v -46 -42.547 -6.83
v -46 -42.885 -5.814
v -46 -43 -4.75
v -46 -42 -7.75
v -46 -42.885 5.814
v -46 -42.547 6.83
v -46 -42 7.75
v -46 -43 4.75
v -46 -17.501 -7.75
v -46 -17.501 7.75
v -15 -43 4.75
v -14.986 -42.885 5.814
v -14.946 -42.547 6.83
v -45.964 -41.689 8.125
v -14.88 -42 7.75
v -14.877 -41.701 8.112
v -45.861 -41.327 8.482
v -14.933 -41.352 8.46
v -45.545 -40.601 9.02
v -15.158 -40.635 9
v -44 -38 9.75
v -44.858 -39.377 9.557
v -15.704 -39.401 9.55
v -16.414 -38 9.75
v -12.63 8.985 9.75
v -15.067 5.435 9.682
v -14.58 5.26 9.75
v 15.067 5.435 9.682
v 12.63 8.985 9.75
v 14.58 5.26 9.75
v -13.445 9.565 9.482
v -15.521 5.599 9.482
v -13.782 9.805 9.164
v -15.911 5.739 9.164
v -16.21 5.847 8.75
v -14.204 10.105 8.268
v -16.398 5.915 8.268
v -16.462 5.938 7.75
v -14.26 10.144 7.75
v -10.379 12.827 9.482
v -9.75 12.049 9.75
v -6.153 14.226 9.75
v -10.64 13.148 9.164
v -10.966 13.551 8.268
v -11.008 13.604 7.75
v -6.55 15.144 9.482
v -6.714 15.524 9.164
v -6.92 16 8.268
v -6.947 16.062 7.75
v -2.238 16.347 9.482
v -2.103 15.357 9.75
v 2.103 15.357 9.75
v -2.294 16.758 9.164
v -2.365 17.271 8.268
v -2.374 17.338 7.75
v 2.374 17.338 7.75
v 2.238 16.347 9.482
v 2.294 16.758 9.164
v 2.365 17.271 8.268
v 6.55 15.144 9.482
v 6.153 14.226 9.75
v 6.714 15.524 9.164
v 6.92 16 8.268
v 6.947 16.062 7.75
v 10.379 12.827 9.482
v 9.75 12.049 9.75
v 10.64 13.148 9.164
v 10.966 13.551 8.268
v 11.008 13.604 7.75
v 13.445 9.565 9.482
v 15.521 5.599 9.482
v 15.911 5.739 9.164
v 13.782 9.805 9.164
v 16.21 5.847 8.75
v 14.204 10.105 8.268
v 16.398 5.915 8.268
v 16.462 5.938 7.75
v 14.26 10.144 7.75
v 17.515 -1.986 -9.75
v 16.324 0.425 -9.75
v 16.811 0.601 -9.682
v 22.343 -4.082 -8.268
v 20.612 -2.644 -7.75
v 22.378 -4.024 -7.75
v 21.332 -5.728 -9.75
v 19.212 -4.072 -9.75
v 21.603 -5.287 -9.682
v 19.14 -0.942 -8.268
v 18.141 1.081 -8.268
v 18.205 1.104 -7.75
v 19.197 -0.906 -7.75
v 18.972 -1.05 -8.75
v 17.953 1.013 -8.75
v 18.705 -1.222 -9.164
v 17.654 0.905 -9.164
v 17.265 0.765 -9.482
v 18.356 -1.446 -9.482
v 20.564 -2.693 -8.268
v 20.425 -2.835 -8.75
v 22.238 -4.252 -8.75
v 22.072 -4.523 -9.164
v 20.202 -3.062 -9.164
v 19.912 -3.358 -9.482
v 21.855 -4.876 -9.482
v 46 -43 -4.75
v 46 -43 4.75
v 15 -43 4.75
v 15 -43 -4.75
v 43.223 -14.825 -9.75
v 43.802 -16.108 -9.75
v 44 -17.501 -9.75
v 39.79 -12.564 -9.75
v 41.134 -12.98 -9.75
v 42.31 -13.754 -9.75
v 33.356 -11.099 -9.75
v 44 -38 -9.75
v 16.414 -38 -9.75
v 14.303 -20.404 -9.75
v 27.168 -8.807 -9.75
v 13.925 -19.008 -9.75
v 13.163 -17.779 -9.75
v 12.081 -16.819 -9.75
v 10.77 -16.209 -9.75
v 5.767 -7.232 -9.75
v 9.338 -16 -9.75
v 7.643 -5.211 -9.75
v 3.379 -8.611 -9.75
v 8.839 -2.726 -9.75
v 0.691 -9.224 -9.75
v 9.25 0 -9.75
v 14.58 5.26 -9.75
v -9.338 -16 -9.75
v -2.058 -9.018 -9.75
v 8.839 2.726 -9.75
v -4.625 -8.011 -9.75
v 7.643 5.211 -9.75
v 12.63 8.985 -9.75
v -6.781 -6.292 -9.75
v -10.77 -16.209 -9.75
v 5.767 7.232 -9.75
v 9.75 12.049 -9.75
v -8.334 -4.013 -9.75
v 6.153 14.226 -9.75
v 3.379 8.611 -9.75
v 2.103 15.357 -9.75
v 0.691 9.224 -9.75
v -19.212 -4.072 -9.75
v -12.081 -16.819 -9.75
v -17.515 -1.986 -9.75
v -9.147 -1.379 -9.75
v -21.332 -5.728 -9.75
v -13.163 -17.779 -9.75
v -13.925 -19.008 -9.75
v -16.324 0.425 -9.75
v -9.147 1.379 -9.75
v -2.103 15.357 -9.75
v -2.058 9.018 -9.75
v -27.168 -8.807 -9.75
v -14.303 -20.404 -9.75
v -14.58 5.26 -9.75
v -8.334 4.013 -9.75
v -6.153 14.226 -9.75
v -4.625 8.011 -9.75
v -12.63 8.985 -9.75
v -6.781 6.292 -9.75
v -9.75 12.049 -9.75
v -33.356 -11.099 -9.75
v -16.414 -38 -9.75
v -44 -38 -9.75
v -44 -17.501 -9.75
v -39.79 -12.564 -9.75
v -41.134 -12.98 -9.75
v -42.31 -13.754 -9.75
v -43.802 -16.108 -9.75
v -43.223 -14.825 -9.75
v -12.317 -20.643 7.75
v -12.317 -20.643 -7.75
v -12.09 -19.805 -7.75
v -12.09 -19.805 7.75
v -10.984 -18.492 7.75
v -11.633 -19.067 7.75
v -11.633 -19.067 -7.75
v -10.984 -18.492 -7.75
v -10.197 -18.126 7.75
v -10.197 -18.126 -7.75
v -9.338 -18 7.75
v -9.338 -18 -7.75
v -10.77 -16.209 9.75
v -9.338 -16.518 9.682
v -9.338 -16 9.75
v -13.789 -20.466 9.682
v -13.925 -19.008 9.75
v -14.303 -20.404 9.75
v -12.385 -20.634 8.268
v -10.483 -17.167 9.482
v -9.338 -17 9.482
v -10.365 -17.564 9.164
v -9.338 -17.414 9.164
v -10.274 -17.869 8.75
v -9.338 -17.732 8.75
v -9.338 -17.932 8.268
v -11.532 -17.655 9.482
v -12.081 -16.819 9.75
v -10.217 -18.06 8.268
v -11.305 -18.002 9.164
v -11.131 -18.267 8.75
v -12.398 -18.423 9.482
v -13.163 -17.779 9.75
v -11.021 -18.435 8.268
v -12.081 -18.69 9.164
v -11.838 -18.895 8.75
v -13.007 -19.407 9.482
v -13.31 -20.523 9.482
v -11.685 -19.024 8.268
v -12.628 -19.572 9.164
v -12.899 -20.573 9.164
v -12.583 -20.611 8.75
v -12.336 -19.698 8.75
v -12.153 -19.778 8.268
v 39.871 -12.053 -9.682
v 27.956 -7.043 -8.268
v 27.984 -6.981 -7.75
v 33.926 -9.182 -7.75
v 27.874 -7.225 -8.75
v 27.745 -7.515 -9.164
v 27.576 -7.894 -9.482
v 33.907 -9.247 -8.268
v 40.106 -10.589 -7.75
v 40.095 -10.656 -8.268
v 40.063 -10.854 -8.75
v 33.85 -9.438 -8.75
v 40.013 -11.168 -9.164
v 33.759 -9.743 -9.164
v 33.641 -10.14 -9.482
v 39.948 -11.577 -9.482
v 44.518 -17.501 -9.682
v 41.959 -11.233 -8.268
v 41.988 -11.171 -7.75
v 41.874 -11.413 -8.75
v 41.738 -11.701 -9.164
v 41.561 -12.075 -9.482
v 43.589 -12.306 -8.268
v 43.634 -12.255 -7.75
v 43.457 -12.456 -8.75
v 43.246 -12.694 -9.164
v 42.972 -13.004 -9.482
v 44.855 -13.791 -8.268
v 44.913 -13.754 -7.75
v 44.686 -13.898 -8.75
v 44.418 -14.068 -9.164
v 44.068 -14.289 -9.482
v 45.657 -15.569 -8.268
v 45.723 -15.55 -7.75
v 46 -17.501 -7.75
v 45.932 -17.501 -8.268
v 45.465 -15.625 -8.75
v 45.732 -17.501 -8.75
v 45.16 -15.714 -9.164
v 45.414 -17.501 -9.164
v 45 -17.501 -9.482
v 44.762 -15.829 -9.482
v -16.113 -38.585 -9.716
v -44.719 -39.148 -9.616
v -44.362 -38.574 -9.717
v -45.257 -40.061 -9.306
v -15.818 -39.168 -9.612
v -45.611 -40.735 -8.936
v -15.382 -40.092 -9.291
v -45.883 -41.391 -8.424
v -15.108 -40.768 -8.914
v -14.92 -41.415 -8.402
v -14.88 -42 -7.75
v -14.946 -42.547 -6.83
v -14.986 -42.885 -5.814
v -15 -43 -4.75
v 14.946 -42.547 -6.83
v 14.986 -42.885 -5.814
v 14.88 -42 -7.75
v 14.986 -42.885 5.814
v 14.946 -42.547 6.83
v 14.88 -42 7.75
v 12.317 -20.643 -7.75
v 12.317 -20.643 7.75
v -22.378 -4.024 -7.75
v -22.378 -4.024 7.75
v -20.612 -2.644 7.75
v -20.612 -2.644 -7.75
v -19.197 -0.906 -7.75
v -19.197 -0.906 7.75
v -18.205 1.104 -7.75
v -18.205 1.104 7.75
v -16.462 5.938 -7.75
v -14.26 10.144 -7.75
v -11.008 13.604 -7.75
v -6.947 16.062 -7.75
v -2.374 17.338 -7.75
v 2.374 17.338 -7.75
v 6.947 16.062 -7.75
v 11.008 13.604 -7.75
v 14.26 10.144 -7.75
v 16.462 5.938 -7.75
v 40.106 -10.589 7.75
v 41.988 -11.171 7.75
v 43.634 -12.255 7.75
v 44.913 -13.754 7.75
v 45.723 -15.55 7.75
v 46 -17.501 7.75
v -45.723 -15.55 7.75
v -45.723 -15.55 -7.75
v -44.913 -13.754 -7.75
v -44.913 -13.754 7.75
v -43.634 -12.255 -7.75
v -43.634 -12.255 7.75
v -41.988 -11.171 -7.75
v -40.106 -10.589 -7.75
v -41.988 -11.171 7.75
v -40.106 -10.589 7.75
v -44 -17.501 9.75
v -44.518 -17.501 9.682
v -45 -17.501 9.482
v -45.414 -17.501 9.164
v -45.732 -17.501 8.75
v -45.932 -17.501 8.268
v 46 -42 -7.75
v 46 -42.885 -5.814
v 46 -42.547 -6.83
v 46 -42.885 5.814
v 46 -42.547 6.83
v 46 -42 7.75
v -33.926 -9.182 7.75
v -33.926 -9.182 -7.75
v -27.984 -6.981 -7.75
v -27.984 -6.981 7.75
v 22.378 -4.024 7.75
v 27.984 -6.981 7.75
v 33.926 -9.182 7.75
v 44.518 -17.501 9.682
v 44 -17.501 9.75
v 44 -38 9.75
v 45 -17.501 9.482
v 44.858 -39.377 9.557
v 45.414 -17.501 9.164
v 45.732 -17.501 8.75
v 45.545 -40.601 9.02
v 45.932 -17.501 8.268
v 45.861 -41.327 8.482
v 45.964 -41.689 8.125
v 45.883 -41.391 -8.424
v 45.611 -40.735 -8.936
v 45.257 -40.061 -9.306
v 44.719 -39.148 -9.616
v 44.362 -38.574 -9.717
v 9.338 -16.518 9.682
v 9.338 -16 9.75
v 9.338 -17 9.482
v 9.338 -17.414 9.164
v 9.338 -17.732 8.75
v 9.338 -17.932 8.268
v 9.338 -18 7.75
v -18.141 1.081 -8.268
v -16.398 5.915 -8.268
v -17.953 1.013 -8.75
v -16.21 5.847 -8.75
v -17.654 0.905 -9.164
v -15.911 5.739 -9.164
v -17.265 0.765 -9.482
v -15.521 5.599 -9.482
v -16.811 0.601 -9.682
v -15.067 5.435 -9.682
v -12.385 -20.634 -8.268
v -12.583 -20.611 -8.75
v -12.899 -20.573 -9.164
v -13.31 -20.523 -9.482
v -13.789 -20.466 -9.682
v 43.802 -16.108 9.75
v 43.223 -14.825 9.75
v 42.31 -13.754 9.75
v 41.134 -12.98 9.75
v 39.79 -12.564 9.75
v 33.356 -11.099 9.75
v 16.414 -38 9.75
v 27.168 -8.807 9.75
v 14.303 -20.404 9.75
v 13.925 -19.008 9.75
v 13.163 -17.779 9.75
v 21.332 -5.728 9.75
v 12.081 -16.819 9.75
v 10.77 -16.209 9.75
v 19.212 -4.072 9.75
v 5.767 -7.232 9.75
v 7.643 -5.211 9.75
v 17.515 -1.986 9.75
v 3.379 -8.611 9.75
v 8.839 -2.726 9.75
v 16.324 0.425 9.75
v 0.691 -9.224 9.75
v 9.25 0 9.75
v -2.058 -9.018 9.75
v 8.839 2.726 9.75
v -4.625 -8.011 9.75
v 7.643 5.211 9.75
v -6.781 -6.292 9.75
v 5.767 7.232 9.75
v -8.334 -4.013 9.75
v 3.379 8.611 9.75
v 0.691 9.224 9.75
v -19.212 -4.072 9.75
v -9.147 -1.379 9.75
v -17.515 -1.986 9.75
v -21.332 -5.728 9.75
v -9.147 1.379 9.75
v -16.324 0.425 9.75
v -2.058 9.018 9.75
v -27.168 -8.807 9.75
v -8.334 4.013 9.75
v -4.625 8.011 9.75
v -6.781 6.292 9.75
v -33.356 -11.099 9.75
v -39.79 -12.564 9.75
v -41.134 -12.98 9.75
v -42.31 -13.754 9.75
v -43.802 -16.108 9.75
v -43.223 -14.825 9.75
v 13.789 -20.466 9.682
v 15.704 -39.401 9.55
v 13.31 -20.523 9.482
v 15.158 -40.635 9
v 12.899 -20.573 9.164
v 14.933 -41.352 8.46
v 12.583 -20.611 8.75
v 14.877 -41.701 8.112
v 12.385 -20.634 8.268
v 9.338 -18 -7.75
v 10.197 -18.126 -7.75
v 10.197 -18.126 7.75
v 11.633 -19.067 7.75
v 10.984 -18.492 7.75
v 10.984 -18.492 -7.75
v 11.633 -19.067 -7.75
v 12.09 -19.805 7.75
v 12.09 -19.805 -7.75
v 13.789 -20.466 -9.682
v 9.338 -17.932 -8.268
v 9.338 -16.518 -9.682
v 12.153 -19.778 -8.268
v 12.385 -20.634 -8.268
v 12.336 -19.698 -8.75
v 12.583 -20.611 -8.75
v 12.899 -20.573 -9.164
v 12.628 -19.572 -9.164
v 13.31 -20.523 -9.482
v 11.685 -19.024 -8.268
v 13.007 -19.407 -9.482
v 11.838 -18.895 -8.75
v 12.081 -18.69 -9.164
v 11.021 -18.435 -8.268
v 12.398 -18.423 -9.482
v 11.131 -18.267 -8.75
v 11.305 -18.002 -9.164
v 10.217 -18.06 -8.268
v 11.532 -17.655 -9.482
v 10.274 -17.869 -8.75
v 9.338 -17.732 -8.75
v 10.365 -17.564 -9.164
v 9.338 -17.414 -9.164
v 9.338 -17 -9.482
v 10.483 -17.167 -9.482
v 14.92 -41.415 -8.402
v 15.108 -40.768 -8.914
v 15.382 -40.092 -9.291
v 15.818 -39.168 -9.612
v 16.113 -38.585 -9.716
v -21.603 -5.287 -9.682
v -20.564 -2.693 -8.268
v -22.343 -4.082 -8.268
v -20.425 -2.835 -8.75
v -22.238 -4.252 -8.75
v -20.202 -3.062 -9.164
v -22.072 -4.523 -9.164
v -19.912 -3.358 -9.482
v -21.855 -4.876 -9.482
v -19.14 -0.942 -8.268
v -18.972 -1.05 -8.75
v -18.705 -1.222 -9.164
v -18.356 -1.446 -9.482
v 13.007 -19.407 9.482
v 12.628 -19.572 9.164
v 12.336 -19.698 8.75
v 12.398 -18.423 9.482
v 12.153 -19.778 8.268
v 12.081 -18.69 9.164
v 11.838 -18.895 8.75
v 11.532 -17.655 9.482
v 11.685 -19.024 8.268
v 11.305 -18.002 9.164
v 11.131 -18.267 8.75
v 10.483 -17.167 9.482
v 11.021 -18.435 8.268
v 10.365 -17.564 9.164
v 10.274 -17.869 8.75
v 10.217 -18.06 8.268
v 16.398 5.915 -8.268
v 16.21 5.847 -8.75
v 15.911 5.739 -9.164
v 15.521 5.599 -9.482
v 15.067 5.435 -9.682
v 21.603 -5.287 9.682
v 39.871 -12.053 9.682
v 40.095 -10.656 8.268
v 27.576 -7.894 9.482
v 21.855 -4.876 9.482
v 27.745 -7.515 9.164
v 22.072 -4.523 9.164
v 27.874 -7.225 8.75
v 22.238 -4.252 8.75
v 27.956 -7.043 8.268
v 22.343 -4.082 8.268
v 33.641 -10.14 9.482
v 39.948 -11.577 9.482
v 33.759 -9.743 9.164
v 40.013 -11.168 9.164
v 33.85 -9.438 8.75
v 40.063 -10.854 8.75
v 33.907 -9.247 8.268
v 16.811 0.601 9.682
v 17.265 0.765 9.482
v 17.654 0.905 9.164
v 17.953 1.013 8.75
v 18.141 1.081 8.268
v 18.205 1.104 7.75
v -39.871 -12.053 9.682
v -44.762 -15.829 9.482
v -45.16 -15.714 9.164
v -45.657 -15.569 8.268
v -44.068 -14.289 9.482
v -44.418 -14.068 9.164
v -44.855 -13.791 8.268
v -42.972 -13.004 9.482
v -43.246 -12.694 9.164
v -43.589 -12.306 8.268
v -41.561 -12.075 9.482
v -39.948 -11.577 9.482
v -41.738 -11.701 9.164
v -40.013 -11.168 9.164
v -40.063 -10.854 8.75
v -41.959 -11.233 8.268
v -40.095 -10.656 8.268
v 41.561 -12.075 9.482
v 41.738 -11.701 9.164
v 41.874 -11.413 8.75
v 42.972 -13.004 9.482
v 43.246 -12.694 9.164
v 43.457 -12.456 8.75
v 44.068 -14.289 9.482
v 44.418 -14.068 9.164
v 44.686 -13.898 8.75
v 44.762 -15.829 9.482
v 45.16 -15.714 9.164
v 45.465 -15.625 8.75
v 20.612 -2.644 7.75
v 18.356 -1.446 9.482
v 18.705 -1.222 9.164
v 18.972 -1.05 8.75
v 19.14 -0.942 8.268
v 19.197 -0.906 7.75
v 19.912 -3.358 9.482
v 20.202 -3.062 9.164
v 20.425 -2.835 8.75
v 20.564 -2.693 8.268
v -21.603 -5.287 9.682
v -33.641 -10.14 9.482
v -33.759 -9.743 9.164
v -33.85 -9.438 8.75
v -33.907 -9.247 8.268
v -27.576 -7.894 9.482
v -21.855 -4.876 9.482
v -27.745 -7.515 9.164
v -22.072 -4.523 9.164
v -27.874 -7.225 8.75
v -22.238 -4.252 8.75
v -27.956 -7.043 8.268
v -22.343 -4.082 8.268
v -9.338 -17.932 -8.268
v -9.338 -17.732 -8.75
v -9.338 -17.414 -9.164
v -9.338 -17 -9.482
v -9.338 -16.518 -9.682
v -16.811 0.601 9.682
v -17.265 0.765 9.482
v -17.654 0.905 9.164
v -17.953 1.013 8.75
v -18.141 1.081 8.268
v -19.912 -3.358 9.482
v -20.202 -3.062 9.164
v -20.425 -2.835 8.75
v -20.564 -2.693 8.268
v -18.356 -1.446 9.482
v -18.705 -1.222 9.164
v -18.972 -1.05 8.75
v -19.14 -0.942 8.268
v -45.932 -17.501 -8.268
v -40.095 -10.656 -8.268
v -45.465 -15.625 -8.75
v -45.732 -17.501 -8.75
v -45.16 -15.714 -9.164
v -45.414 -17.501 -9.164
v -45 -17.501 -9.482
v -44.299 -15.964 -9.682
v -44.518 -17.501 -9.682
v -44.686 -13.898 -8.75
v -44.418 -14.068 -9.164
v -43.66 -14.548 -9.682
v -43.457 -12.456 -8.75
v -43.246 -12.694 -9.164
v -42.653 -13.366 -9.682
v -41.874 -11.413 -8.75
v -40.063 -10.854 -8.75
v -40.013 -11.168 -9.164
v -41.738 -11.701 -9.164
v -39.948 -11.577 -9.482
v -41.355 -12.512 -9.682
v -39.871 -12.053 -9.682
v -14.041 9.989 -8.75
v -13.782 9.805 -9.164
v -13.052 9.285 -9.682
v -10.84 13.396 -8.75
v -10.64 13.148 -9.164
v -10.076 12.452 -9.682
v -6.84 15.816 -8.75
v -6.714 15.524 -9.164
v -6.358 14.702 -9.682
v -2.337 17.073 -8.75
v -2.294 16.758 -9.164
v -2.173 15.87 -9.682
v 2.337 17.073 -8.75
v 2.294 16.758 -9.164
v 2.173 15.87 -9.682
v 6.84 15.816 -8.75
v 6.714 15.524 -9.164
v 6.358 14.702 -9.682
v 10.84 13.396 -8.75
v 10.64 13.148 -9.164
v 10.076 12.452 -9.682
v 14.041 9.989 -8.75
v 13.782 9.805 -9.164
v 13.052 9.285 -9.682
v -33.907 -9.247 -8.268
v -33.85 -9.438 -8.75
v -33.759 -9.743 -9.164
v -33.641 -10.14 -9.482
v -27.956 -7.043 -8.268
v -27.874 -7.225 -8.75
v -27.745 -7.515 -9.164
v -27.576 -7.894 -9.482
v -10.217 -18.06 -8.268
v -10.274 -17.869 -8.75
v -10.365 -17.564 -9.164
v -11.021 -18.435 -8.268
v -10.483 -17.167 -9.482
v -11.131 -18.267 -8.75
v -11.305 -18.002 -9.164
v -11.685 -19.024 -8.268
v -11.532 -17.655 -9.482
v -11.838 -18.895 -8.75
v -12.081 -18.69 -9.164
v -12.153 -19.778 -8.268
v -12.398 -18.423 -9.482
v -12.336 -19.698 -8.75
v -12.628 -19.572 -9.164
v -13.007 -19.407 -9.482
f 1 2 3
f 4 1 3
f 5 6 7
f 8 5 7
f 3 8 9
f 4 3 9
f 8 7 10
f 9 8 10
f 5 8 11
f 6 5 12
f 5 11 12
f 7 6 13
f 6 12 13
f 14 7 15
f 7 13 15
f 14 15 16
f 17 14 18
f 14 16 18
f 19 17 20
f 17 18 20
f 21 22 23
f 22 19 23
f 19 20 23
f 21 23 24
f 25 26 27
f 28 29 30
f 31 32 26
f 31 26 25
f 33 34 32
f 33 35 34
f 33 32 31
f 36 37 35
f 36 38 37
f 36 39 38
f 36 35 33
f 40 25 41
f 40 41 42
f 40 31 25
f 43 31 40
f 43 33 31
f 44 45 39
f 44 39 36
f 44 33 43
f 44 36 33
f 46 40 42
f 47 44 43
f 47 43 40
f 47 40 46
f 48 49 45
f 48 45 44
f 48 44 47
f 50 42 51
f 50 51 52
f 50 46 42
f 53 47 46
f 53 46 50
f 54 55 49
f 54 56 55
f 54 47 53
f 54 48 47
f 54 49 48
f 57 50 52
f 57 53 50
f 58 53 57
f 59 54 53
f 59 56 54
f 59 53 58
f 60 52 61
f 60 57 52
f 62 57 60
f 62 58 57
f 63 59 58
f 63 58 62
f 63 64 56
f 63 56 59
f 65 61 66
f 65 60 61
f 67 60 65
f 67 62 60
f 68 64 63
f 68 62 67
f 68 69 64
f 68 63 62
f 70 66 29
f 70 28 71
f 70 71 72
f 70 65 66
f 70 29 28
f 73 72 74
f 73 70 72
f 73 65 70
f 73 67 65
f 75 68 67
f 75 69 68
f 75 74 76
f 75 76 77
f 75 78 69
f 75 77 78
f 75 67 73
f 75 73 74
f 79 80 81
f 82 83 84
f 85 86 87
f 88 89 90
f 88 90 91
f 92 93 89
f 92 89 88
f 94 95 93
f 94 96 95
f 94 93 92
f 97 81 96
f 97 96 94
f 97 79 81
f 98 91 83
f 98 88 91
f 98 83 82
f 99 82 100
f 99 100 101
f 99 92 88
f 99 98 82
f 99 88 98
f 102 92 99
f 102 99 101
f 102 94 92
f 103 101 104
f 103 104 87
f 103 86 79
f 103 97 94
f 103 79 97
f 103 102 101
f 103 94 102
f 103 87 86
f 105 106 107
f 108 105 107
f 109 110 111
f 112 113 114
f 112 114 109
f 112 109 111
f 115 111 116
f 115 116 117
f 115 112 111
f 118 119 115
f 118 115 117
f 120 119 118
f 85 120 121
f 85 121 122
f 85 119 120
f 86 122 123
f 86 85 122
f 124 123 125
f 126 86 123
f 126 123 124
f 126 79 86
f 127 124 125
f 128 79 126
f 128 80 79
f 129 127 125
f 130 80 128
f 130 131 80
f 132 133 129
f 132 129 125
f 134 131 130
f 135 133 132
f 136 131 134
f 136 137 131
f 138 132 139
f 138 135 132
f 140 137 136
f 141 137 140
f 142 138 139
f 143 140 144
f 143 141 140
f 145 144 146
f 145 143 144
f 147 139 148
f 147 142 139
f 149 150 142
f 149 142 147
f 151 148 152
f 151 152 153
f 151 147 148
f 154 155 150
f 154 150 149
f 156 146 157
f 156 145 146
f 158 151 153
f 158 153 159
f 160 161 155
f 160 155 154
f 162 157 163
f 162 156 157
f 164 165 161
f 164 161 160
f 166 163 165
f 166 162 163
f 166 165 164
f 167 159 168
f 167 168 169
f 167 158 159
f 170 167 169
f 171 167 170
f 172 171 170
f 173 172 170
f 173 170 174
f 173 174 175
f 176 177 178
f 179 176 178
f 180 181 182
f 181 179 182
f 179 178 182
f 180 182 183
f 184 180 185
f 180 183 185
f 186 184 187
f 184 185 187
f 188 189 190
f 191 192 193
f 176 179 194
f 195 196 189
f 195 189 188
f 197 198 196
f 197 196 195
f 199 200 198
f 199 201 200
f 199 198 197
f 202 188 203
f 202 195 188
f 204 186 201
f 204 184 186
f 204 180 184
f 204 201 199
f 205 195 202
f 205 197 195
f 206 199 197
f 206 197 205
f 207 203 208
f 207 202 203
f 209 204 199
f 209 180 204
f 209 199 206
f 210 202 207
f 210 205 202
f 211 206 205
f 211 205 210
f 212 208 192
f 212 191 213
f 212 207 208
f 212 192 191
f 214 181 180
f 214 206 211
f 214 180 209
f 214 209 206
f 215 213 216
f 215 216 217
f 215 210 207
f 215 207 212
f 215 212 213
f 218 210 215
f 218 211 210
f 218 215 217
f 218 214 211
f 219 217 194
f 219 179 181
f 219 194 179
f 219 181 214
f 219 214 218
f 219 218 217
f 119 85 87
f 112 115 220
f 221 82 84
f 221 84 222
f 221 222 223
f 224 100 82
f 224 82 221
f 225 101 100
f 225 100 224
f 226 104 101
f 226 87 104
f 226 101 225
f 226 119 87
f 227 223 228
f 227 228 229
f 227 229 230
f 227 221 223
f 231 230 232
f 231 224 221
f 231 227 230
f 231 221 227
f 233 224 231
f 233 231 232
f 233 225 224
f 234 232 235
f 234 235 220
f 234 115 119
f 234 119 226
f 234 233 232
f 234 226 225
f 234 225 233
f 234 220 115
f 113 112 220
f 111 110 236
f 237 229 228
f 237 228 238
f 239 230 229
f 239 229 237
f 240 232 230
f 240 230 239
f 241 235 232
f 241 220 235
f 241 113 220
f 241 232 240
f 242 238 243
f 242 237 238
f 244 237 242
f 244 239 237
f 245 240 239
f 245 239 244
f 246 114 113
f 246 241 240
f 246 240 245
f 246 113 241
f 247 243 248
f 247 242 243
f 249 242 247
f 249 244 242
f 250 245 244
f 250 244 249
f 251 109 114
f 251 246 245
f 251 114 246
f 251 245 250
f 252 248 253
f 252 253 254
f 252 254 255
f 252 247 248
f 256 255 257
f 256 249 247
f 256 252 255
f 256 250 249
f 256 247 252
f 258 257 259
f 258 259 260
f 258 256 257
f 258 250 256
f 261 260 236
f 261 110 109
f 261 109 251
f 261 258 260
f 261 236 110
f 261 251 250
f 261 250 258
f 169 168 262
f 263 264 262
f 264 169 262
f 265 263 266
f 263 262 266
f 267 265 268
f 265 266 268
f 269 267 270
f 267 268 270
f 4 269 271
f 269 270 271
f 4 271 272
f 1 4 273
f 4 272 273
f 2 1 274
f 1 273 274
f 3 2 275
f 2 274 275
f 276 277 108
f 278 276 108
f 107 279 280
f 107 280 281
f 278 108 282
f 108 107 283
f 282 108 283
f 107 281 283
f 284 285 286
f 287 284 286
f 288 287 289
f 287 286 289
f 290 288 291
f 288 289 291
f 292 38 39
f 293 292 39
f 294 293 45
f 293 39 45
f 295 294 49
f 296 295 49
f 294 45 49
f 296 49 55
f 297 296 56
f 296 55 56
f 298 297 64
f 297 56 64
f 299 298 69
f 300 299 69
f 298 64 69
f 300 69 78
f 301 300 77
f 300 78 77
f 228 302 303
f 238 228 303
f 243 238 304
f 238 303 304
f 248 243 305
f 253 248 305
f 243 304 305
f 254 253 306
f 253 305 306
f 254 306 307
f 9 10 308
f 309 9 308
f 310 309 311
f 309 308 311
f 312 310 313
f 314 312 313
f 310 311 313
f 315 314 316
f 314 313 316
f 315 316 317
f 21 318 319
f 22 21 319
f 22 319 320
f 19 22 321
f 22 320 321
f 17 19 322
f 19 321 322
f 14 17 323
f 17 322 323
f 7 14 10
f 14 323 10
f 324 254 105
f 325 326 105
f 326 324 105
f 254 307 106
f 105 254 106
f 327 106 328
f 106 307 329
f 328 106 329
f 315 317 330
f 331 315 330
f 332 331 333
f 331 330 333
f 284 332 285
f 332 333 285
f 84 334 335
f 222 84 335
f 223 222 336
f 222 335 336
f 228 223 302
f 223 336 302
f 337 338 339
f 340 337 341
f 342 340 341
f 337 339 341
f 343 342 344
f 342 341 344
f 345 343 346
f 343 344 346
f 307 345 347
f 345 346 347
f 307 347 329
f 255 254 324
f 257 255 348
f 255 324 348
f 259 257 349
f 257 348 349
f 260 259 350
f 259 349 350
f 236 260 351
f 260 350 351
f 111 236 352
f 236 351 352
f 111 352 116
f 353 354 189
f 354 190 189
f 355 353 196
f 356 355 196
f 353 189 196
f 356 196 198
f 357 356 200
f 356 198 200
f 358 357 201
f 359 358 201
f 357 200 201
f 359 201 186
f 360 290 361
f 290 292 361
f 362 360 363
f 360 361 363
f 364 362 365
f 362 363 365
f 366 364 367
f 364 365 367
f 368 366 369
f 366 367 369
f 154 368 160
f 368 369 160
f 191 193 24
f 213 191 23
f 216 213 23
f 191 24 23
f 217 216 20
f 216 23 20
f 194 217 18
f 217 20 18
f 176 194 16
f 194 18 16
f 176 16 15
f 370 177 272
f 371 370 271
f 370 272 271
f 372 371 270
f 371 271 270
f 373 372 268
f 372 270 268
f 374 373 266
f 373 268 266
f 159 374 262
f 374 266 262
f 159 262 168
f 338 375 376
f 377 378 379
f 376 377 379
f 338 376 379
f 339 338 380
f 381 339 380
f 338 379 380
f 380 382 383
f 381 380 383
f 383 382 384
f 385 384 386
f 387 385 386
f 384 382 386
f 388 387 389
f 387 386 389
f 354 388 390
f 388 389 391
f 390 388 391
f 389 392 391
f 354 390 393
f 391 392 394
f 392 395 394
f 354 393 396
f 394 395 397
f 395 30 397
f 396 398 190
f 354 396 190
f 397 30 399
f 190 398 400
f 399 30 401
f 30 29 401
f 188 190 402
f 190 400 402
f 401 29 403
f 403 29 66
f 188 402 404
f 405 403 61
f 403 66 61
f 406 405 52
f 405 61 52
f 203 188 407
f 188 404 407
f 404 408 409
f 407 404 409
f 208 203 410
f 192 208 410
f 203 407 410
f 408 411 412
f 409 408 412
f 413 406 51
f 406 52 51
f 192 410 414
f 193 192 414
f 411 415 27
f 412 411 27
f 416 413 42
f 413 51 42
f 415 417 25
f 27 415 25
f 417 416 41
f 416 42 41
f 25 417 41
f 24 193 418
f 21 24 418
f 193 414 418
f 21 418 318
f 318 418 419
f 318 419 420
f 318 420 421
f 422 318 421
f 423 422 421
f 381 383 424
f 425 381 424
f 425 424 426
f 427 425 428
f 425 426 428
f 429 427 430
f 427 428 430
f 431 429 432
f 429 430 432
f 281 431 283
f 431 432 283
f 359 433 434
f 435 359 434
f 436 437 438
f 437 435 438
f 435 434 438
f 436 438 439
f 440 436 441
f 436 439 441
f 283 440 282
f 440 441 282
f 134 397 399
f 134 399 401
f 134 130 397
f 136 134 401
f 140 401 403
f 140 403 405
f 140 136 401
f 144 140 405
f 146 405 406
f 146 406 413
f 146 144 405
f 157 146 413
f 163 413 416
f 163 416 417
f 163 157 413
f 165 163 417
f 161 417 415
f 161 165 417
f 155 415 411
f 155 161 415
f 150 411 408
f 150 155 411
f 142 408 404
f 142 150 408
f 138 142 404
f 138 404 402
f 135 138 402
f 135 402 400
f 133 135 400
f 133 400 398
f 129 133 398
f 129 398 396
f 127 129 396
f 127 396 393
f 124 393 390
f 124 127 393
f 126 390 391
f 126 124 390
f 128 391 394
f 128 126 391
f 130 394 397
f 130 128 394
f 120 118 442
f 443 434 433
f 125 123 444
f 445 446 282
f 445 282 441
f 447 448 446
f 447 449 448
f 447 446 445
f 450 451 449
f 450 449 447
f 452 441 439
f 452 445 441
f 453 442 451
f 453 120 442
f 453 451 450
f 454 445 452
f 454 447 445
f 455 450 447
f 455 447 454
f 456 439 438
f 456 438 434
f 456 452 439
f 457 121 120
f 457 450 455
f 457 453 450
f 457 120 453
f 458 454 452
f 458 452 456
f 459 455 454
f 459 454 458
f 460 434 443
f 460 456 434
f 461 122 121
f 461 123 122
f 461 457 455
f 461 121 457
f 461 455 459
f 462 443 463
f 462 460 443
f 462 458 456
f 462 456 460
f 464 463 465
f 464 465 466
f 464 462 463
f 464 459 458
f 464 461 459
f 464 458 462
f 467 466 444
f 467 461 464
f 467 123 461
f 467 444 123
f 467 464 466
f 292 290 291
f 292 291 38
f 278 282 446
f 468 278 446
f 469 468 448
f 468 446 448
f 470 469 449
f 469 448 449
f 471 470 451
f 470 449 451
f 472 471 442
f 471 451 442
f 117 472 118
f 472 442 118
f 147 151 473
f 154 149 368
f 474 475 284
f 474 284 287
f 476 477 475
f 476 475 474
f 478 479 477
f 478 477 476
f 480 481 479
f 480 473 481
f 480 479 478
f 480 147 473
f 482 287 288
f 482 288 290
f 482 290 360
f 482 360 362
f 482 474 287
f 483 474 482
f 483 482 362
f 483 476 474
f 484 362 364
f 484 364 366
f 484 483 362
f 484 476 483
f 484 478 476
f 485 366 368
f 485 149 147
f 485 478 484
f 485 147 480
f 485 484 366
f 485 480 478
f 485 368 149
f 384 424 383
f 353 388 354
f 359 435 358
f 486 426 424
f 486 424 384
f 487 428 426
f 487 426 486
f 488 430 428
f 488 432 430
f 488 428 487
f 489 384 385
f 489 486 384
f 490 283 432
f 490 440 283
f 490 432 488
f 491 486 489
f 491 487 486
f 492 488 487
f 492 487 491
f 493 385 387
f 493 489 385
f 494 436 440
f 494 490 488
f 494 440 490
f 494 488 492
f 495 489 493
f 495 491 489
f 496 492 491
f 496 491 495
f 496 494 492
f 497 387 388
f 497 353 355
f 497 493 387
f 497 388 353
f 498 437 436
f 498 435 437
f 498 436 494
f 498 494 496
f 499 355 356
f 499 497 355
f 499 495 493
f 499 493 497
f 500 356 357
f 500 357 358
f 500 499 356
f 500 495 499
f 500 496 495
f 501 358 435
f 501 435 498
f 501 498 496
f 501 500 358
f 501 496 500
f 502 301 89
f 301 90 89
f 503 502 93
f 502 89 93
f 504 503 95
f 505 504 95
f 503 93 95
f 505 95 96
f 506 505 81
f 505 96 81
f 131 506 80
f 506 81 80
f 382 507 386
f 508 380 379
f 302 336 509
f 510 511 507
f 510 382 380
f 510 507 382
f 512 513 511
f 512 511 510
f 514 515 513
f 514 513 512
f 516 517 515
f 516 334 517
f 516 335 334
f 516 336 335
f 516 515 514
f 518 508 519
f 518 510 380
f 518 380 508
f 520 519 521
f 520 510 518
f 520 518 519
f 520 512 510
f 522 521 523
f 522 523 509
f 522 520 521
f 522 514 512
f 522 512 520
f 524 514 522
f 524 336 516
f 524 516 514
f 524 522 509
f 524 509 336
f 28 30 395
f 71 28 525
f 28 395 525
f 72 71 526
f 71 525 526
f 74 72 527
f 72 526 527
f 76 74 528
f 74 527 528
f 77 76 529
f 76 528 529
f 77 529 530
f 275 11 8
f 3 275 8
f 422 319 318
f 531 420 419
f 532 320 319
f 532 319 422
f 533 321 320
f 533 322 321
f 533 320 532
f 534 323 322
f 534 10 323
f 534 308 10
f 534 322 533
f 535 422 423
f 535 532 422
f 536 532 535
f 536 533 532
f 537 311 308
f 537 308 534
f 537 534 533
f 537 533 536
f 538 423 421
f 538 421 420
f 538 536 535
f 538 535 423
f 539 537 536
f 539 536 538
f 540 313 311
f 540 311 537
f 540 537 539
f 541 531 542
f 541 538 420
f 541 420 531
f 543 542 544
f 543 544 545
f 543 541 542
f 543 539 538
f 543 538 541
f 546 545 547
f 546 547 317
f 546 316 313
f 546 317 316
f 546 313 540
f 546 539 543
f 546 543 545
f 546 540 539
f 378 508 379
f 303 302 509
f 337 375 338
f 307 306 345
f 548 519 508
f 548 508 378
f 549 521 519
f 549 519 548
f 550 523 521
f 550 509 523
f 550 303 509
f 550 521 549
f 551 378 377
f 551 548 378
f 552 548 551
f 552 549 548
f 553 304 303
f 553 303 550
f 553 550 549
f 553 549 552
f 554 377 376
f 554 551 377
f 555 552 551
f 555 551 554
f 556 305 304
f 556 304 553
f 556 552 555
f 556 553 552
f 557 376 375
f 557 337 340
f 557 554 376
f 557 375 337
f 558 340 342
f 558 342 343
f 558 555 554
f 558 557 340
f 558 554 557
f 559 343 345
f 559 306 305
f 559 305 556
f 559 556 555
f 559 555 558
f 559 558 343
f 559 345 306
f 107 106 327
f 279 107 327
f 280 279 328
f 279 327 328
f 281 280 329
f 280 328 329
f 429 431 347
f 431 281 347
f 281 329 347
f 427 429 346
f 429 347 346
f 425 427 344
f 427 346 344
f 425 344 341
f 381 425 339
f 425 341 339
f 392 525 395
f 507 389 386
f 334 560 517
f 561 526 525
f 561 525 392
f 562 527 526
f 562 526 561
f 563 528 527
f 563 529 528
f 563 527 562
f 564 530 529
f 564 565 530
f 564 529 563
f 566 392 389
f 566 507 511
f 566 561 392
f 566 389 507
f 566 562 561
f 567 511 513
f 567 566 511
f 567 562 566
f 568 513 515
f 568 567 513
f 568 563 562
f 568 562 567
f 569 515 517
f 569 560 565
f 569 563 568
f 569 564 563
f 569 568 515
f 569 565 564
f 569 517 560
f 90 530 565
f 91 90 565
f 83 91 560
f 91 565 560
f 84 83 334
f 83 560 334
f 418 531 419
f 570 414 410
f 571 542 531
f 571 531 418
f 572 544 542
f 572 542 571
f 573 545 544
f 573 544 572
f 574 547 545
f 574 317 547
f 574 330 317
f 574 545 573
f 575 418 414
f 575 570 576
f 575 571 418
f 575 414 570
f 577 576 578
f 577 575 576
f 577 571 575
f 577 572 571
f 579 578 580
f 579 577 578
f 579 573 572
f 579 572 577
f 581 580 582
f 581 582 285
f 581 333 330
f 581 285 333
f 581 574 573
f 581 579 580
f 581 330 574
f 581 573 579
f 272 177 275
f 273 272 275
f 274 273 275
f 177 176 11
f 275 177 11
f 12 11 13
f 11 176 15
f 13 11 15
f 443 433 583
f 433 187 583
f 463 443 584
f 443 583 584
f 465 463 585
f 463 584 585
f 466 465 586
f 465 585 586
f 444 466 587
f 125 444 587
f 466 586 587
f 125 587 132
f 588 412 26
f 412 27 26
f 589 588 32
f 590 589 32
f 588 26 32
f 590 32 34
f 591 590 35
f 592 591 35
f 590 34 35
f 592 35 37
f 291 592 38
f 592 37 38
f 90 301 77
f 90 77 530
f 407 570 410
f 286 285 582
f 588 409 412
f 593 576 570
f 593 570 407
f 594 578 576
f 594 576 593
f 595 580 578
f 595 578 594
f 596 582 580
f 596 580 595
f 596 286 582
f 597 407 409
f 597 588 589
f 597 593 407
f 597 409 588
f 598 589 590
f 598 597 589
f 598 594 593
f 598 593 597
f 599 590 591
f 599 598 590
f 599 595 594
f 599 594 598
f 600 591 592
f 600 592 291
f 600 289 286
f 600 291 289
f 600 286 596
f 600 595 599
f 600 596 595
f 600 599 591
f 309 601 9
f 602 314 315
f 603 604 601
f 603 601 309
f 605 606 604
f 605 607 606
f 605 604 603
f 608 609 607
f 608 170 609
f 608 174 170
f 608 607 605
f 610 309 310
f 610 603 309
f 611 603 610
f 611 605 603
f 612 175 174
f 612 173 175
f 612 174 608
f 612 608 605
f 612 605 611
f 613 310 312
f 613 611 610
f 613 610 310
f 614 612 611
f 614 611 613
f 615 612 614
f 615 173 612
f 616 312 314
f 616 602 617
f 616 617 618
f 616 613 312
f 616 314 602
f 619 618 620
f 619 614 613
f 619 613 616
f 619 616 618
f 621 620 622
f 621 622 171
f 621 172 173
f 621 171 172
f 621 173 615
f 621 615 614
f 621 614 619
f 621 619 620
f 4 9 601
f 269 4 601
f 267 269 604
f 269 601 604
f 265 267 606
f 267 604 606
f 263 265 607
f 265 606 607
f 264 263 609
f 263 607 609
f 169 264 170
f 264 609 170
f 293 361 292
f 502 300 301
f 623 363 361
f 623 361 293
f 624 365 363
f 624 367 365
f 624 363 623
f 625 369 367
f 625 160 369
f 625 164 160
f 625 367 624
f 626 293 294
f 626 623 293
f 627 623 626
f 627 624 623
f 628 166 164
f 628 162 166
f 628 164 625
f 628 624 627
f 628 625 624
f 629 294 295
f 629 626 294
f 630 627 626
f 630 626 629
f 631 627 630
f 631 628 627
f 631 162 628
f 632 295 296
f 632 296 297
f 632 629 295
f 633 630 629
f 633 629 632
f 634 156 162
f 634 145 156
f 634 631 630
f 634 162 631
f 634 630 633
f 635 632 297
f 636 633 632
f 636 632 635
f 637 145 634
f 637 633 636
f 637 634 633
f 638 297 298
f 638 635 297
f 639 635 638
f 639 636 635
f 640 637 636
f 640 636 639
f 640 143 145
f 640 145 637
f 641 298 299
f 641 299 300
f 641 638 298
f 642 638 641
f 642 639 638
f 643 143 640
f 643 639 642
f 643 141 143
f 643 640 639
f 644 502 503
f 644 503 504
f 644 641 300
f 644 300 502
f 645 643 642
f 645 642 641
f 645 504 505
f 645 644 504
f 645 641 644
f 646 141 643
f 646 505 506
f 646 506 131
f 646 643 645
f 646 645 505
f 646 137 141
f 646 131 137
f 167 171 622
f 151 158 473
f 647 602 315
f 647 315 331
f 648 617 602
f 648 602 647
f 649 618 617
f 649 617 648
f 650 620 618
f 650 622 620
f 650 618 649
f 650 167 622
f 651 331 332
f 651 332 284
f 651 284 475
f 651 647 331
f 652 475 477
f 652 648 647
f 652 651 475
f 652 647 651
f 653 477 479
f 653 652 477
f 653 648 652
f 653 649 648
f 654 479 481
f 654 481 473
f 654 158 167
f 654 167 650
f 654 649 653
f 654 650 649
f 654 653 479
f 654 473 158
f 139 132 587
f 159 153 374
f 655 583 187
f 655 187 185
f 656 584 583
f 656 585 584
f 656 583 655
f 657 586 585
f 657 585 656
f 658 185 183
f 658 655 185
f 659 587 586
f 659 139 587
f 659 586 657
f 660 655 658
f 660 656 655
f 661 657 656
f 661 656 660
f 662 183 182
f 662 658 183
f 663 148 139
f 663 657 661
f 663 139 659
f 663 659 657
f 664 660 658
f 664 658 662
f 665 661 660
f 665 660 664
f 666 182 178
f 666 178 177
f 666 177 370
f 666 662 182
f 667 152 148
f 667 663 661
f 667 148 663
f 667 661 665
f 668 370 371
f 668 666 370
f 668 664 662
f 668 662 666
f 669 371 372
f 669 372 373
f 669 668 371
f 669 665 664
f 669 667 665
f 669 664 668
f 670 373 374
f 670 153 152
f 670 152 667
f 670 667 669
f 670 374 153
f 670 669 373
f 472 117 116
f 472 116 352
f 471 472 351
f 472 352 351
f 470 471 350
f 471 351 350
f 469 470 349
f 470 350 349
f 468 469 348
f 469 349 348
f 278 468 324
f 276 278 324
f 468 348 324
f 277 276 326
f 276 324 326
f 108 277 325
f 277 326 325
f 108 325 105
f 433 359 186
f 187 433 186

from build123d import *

# Parameters (mm, degrees)
CROQUIS1_R              = 9.25
SALIENTE_EXTRUIR1_DEPTH = 9.75
REDONDEO4_R             = 3
REDONDEO5_R             = 2
REDONDEO6_R             = 5


with BuildPart() as part:
    # Croquis1 → Saliente-Extruir1 (new, symmetric)
    with BuildSketch(Plane.XY):
        with BuildLine():
            Line((16.461713879, 5.938179534), (18.205490224, 1.104114294))
            ThreePointArc((18.205490224, 1.104114294), (19.855946903, -1.814596224), (22.378427867, -4.023661212))
            ThreePointArc((22.378427867, -4.023661212), (30.919049272, -8.178302275), (40.105510362, -10.589150466))
            ThreePointArc((40.105510362, -10.589150466), (44.326282594, -12.959198031), (46, -17.50130258))
            Line((46, -17.50130258), (46, -18.509558121))
            Line((46, -18.509558121), (46, -43))
            Line((46, -43), (15, -43))
            Line((15, -43), (12, -18))
            Line((12, -18), (-12, -18))
            Line((-12, -18), (-15, -43))
            Line((-15, -43), (-46, -43))
            Line((-46, -43), (-46, -18.509558121))
            Line((-46, -18.509558121), (-46, -17.50130258))
            ThreePointArc((-46, -17.50130258), (-44.326282594, -12.959198031), (-40.105510362, -10.589150466))
            ThreePointArc((-40.105510362, -10.589150466), (-30.919049272, -8.178302275), (-22.378427867, -4.023661212))
            ThreePointArc((-22.378427867, -4.023661212), (-19.855946903, -1.814596224), (-18.205490224, 1.104114294))
            Line((-18.205490224, 1.104114294), (-16.461713879, 5.938179534))
            ThreePointArc((-16.461713879, 5.938179534), (0, 17.5), (16.461713879, 5.938179534))
        make_face()
        Circle(CROQUIS1_R, mode=Mode.SUBTRACT)
    extrude(amount=SALIENTE_EXTRUIR1_DEPTH, both=True)

    # Redondeo4
    redondeo4_edges = [part.edges().sort_by_distance(p)[0] for p in [
        (12, -18, 0),
        (-12, -18, 0),
    ]]
    fillet(redondeo4_edges, radius=REDONDEO4_R)

    # Redondeo5
    redondeo5_edges = [part.edges().sort_by_distance(p)[0] for p in [
        (-19.855946903, -1.814596224, 9.75),
        (-30.919049272, -8.178302275, 9.75),
        (17.333602052, 3.521146914, -9.75),
        (-44.326282594, -12.959198031, 9.75),
        (19.855946903, -1.814596224, -9.75),
        (30.919049272, -8.178302275, -9.75),
        (44.326282594, -12.959198031, -9.75),
        (46, -30.25065129, -9.75),
        (-46, -30.25065129, 9.75),
        (-13.65855386, -31.821282169, -9.75),
        (-46, -30.25065129, -9.75),
        (-44.326282594, -12.959198031, -9.75),
        (-30.919049272, -8.178302275, -9.75),
        (-19.855946903, -1.814596224, -9.75),
        (-17.333602052, 3.521146914, -9.75),
        (0, 17.5, -9.75),
        (-13.65855386, -31.821282169, 9.75),
        (0, 17.5, 9.75),
        (46, -30.25065129, 9.75),
        (44.326282594, -12.959198031, 9.75),
        (30.919049272, -8.178302275, 9.75),
        (19.855946903, -1.814596224, 9.75),
        (13.65855386, -31.821282169, -9.75),
        (13.65855386, -31.821282169, 9.75),
        (0, -18, -9.75),
        (17.333602052, 3.521146914, 9.75),
        (0, -18, 9.75),
        (11.329418316, -18.755862417, -9.75),
        (11.329418316, -18.755862417, 9.75),
        (-11.329418316, -18.755862417, -9.75),
        (-11.329418316, -18.755862417, 9.75),
        (-17.333602052, 3.521146914, 9.75),
    ]]
    fillet(redondeo5_edges, radius=REDONDEO5_R)

    # Redondeo6
    # the kernel refuses this fillet: 5 mm, written as the material it takes off along each edge
    with BuildSketch(Plane(origin=(56.5, -43, 9.75), x_dir=(0, 1, 0), z_dir=(-1, 0, 0)), Plane(origin=(-4.51434853, -43, 9.75), x_dir=(0, 1, 0), z_dir=(-1, 0, 0)), Plane(origin=(56.5, -43, -9.75), x_dir=(0, 0, 1), z_dir=(-1, 0, 0)), Plane(origin=(-4.51434853, -43, -9.75), x_dir=(0, 0, 1), z_dir=(-1, 0, 0))) as redondeo6_piece_1:
        with BuildLine():
            CenterArc((REDONDEO6_R, REDONDEO6_R), REDONDEO6_R, 180, 90)
            Line((0, REDONDEO6_R), (0, 0))
            Line((0, 0), (REDONDEO6_R, 0))
        make_face()
    extrude(amount=51.98565147, mode=Mode.SUBTRACT)


solid = part.part
